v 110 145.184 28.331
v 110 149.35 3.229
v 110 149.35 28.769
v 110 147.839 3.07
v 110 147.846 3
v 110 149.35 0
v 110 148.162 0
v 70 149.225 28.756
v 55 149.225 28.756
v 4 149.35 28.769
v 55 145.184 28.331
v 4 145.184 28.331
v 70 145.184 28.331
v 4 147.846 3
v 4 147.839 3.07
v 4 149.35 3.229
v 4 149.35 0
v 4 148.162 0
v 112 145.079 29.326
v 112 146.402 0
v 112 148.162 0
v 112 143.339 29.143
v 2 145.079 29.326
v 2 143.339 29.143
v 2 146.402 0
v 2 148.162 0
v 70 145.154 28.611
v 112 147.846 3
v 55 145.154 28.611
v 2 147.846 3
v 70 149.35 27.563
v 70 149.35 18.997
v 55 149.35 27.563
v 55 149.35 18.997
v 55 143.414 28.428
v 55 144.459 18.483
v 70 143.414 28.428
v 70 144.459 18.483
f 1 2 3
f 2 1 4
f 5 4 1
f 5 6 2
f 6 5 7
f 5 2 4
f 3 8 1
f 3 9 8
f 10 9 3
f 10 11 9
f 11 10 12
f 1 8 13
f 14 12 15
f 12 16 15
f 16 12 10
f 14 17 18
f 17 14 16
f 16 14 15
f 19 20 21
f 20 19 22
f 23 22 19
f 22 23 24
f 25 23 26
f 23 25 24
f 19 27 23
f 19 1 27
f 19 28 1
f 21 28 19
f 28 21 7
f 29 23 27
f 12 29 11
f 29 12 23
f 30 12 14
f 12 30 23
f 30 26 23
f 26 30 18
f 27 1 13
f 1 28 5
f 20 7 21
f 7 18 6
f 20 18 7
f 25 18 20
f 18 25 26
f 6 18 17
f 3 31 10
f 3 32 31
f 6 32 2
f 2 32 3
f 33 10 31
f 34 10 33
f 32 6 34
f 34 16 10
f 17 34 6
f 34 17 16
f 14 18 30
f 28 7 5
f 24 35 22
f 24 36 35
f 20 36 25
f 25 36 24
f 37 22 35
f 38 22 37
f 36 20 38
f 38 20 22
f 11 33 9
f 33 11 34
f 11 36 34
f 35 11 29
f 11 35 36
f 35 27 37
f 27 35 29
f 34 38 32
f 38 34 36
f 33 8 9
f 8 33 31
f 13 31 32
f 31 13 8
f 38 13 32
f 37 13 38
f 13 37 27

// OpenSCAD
// file: screen_v2.scad
$fn=16;
module LCD(){
    cube([47.7+1,51.35+1,3.68-1.6]);
}

module visable_area(){
    cube([43.2,43.2,10]);
}

module PCB(){
    difference(){
        cube([61,51.35,1.6+0.5]);//add 0.5 for extra pin height
        translate([3.5,8.5,-0.1])cylinder(h=1.6+0.2,d=2.5); //changed all r from 3 then changed from 2.8 to 2.5
        translate([3.5,8.5+34.35,-0.1])cylinder(h=1.6+0.2,d=2.5);
        translate([3.5+54,8.5,-0.1])cylinder(h=1.6+0.2,d=2.5);
        translate([3.5+54,8.5+34.35,-0.1])cylinder(h=1.6+0.2,d=2.5);
    }
}

module ribbon(){
    cube([33,1,3.68]);
}
module screen_all(){
   translate([47.7+6.65,0,3.68]) rotate([0,180,0])union(){ 
       color("red") translate([(-6.65),0,-0.5])PCB();
       color("black") translate([-0.5,-0.5,1.6])LCD();
       color("blue") translate([(47.7-43.2)/2,6.55,1.6]) visable_area();
       color("orange") translate([(47.7-33)/2,-1,0])ribbon();
    }
}
screen_all();
// main file
//V1.03 added extra space for buttons and for the back plate to slide in

$fn=32;
use <screen_v2.scad>

module switch_cutout(){
    translate([-0.25,-0.25,0])cube([14+0.5,14+0.5,1.5]);
    translate([-2,-2,1.5]) cube([18,18,1.5]);
}
//switch_cutout();

module key_plate(){
    difference(){
        union(){ //add box to leave screen mountings
            cube([110,74+51.35+20+10,3]);
            translate([((110-61)/2)+0.25,74+10+0.25,3]) cube([61-0.6,51.35-0.5,1.6+0.5]);
        }
        //side_edge();
        //translate([110,150,0])rotate([0,0,180])side_edge();
        translate([0,2,0])rotate([90+33.69,0,0]) cube([110,4,4]); //bottom edge
        translate([2,0,0]) rotate([0,-33.69-90,0]) cube([4,150,4]); //lefthand side
        translate([110,150,0])rotate([0,0,180])translate([2,0,0]) rotate([0,-33.69-90,0]) cube([4,150,4]); //righthand side
        
        //grid of switches
        translate([12,12,0]) switch_cutout();
        translate([(12+14+10),12,0]) switch_cutout();
        translate([(12+(10*2)+(14*2)),12,0]) switch_cutout();
        translate([110-14-12,12,0]) switch_cutout();
        
        translate([12,(12+14+10),0]) switch_cutout();
        translate([(12+14+10),(12+14+10),0]) switch_cutout();
        translate([(12+(10*2)+(14*2)),(12+14+10),0]) switch_cutout();
        translate([110-14-12,(12+14+10),0]) switch_cutout();

        translate([12,(12+14*2+10*2),0]) switch_cutout();
        translate([(12+14+10),(12+14*2+10*2),0]) switch_cutout();
        translate([(12+(10*2)+(14*2)),(12+14*2+10*2),0]) switch_cutout();
        translate([110-14-12,(12+14*2+10*2),0]) switch_cutout();
        
        translate([(110-61)/2,74+10,3-(3.68-1.6)]) screen_all();

        
    }
}
//key_plate();

module key_plate_to_print(){
    //trim extra length off
    difference(){
        key_plate();
        translate([0,74+51.35+20-0.5,-2.5]) rotate([6,0,0])cube([110,10+5,3+5]);
    }
}
//key_plate_to_print();

module back_panel(){
    difference(){
        rotate ([6,0,0]) union(){
            cube([110,2,15.4+15]); //slot
            //translate([0,2,0]) cube([110,5,3]);
           translate([2,2,0]) cube([110-4,5,(15.7+15)-1]);
        }
        translate([0,0,-5+0.73])cube([110,10,5]);
        translate([0,149.53-145,0]) cube([110,5,30]);
    }
}
//translate([0,170,0]) back_panel();
module new_back_panel(){
    difference(){
        translate([0,74+51.35+20,-5])rotate([6,0,0])cube([110+4,30,35]);
        translate([0,74+51.35+20+2+2,-20]) cube([110+4,50,60]);
        base();
        translate([0,0,-50]) cube([110+4,74+51.35+20+2+10,50]);
        rotate([6,0,0])translate([2,74+51.35+20+2,-15.9])cube([2,2,3.5]);
        rotate([6,0,0])translate([110,74+51.35+20+2,-15.9])cube([2,2,3.5]);
        #rotate([6,0,0])translate([2,74+51.35-8-2+20+0.25,-15-1]) cube([110,2+8,15+15.4+1]);
        
        translate([110/2,74+51.35+5,15+2])rotate([6,0,0])cube([15,20,10]);//hole for usb
        
    }
}
//rotate([-6-90,0,0])new_back_panel();
new_back_panel();
module base(){
    difference(){
        rotate([6,0,0])
        difference(){
            //rotate([6,0,0]) 
            translate([0,0,-20]) cube([110+4,74+51.35+20+2+10,15+20]);
            //#rotate([6,0,0]) 
            translate([4,4,-20]) cube([110-4,74+51.35+20-2+10,15-2+20]);
            
            #translate([110,120,0])rotate([0,90,0])cylinder(h = 4, d=7);//hole for rotary encoder
            
            translate([2,74+51.35+20,-15.4-1]) cube([110,2,15+15.4]); //slot for back panel
            
            
        }
        //translate([2,74+51.35+20,-15.19-1]) back_panel(); //slot for back panel
        
        translate([0,0,-50]) cube([110+4,74+51.35+20+2+10,50]);
        translate([2,2,0]) key_plate();
        
        //make back square/trim base
        translate([0,74+51.35+20+2+2,-20]) cube([110+4,50,60]);
    }
}


//base();
//translate([2,0,0])key_plate_to_print();
//rotate([0,180,0]) translate([0,0,-15]) rotate([-6,0,0]) base();
//rotate([6,0,0])translate([-2,3,15])rotate([0,180,0])key_plate_to_print();
//translate([0,170,0]) back_panel();
//base();
//color("red") translate([2,2,0]) key_plate();
